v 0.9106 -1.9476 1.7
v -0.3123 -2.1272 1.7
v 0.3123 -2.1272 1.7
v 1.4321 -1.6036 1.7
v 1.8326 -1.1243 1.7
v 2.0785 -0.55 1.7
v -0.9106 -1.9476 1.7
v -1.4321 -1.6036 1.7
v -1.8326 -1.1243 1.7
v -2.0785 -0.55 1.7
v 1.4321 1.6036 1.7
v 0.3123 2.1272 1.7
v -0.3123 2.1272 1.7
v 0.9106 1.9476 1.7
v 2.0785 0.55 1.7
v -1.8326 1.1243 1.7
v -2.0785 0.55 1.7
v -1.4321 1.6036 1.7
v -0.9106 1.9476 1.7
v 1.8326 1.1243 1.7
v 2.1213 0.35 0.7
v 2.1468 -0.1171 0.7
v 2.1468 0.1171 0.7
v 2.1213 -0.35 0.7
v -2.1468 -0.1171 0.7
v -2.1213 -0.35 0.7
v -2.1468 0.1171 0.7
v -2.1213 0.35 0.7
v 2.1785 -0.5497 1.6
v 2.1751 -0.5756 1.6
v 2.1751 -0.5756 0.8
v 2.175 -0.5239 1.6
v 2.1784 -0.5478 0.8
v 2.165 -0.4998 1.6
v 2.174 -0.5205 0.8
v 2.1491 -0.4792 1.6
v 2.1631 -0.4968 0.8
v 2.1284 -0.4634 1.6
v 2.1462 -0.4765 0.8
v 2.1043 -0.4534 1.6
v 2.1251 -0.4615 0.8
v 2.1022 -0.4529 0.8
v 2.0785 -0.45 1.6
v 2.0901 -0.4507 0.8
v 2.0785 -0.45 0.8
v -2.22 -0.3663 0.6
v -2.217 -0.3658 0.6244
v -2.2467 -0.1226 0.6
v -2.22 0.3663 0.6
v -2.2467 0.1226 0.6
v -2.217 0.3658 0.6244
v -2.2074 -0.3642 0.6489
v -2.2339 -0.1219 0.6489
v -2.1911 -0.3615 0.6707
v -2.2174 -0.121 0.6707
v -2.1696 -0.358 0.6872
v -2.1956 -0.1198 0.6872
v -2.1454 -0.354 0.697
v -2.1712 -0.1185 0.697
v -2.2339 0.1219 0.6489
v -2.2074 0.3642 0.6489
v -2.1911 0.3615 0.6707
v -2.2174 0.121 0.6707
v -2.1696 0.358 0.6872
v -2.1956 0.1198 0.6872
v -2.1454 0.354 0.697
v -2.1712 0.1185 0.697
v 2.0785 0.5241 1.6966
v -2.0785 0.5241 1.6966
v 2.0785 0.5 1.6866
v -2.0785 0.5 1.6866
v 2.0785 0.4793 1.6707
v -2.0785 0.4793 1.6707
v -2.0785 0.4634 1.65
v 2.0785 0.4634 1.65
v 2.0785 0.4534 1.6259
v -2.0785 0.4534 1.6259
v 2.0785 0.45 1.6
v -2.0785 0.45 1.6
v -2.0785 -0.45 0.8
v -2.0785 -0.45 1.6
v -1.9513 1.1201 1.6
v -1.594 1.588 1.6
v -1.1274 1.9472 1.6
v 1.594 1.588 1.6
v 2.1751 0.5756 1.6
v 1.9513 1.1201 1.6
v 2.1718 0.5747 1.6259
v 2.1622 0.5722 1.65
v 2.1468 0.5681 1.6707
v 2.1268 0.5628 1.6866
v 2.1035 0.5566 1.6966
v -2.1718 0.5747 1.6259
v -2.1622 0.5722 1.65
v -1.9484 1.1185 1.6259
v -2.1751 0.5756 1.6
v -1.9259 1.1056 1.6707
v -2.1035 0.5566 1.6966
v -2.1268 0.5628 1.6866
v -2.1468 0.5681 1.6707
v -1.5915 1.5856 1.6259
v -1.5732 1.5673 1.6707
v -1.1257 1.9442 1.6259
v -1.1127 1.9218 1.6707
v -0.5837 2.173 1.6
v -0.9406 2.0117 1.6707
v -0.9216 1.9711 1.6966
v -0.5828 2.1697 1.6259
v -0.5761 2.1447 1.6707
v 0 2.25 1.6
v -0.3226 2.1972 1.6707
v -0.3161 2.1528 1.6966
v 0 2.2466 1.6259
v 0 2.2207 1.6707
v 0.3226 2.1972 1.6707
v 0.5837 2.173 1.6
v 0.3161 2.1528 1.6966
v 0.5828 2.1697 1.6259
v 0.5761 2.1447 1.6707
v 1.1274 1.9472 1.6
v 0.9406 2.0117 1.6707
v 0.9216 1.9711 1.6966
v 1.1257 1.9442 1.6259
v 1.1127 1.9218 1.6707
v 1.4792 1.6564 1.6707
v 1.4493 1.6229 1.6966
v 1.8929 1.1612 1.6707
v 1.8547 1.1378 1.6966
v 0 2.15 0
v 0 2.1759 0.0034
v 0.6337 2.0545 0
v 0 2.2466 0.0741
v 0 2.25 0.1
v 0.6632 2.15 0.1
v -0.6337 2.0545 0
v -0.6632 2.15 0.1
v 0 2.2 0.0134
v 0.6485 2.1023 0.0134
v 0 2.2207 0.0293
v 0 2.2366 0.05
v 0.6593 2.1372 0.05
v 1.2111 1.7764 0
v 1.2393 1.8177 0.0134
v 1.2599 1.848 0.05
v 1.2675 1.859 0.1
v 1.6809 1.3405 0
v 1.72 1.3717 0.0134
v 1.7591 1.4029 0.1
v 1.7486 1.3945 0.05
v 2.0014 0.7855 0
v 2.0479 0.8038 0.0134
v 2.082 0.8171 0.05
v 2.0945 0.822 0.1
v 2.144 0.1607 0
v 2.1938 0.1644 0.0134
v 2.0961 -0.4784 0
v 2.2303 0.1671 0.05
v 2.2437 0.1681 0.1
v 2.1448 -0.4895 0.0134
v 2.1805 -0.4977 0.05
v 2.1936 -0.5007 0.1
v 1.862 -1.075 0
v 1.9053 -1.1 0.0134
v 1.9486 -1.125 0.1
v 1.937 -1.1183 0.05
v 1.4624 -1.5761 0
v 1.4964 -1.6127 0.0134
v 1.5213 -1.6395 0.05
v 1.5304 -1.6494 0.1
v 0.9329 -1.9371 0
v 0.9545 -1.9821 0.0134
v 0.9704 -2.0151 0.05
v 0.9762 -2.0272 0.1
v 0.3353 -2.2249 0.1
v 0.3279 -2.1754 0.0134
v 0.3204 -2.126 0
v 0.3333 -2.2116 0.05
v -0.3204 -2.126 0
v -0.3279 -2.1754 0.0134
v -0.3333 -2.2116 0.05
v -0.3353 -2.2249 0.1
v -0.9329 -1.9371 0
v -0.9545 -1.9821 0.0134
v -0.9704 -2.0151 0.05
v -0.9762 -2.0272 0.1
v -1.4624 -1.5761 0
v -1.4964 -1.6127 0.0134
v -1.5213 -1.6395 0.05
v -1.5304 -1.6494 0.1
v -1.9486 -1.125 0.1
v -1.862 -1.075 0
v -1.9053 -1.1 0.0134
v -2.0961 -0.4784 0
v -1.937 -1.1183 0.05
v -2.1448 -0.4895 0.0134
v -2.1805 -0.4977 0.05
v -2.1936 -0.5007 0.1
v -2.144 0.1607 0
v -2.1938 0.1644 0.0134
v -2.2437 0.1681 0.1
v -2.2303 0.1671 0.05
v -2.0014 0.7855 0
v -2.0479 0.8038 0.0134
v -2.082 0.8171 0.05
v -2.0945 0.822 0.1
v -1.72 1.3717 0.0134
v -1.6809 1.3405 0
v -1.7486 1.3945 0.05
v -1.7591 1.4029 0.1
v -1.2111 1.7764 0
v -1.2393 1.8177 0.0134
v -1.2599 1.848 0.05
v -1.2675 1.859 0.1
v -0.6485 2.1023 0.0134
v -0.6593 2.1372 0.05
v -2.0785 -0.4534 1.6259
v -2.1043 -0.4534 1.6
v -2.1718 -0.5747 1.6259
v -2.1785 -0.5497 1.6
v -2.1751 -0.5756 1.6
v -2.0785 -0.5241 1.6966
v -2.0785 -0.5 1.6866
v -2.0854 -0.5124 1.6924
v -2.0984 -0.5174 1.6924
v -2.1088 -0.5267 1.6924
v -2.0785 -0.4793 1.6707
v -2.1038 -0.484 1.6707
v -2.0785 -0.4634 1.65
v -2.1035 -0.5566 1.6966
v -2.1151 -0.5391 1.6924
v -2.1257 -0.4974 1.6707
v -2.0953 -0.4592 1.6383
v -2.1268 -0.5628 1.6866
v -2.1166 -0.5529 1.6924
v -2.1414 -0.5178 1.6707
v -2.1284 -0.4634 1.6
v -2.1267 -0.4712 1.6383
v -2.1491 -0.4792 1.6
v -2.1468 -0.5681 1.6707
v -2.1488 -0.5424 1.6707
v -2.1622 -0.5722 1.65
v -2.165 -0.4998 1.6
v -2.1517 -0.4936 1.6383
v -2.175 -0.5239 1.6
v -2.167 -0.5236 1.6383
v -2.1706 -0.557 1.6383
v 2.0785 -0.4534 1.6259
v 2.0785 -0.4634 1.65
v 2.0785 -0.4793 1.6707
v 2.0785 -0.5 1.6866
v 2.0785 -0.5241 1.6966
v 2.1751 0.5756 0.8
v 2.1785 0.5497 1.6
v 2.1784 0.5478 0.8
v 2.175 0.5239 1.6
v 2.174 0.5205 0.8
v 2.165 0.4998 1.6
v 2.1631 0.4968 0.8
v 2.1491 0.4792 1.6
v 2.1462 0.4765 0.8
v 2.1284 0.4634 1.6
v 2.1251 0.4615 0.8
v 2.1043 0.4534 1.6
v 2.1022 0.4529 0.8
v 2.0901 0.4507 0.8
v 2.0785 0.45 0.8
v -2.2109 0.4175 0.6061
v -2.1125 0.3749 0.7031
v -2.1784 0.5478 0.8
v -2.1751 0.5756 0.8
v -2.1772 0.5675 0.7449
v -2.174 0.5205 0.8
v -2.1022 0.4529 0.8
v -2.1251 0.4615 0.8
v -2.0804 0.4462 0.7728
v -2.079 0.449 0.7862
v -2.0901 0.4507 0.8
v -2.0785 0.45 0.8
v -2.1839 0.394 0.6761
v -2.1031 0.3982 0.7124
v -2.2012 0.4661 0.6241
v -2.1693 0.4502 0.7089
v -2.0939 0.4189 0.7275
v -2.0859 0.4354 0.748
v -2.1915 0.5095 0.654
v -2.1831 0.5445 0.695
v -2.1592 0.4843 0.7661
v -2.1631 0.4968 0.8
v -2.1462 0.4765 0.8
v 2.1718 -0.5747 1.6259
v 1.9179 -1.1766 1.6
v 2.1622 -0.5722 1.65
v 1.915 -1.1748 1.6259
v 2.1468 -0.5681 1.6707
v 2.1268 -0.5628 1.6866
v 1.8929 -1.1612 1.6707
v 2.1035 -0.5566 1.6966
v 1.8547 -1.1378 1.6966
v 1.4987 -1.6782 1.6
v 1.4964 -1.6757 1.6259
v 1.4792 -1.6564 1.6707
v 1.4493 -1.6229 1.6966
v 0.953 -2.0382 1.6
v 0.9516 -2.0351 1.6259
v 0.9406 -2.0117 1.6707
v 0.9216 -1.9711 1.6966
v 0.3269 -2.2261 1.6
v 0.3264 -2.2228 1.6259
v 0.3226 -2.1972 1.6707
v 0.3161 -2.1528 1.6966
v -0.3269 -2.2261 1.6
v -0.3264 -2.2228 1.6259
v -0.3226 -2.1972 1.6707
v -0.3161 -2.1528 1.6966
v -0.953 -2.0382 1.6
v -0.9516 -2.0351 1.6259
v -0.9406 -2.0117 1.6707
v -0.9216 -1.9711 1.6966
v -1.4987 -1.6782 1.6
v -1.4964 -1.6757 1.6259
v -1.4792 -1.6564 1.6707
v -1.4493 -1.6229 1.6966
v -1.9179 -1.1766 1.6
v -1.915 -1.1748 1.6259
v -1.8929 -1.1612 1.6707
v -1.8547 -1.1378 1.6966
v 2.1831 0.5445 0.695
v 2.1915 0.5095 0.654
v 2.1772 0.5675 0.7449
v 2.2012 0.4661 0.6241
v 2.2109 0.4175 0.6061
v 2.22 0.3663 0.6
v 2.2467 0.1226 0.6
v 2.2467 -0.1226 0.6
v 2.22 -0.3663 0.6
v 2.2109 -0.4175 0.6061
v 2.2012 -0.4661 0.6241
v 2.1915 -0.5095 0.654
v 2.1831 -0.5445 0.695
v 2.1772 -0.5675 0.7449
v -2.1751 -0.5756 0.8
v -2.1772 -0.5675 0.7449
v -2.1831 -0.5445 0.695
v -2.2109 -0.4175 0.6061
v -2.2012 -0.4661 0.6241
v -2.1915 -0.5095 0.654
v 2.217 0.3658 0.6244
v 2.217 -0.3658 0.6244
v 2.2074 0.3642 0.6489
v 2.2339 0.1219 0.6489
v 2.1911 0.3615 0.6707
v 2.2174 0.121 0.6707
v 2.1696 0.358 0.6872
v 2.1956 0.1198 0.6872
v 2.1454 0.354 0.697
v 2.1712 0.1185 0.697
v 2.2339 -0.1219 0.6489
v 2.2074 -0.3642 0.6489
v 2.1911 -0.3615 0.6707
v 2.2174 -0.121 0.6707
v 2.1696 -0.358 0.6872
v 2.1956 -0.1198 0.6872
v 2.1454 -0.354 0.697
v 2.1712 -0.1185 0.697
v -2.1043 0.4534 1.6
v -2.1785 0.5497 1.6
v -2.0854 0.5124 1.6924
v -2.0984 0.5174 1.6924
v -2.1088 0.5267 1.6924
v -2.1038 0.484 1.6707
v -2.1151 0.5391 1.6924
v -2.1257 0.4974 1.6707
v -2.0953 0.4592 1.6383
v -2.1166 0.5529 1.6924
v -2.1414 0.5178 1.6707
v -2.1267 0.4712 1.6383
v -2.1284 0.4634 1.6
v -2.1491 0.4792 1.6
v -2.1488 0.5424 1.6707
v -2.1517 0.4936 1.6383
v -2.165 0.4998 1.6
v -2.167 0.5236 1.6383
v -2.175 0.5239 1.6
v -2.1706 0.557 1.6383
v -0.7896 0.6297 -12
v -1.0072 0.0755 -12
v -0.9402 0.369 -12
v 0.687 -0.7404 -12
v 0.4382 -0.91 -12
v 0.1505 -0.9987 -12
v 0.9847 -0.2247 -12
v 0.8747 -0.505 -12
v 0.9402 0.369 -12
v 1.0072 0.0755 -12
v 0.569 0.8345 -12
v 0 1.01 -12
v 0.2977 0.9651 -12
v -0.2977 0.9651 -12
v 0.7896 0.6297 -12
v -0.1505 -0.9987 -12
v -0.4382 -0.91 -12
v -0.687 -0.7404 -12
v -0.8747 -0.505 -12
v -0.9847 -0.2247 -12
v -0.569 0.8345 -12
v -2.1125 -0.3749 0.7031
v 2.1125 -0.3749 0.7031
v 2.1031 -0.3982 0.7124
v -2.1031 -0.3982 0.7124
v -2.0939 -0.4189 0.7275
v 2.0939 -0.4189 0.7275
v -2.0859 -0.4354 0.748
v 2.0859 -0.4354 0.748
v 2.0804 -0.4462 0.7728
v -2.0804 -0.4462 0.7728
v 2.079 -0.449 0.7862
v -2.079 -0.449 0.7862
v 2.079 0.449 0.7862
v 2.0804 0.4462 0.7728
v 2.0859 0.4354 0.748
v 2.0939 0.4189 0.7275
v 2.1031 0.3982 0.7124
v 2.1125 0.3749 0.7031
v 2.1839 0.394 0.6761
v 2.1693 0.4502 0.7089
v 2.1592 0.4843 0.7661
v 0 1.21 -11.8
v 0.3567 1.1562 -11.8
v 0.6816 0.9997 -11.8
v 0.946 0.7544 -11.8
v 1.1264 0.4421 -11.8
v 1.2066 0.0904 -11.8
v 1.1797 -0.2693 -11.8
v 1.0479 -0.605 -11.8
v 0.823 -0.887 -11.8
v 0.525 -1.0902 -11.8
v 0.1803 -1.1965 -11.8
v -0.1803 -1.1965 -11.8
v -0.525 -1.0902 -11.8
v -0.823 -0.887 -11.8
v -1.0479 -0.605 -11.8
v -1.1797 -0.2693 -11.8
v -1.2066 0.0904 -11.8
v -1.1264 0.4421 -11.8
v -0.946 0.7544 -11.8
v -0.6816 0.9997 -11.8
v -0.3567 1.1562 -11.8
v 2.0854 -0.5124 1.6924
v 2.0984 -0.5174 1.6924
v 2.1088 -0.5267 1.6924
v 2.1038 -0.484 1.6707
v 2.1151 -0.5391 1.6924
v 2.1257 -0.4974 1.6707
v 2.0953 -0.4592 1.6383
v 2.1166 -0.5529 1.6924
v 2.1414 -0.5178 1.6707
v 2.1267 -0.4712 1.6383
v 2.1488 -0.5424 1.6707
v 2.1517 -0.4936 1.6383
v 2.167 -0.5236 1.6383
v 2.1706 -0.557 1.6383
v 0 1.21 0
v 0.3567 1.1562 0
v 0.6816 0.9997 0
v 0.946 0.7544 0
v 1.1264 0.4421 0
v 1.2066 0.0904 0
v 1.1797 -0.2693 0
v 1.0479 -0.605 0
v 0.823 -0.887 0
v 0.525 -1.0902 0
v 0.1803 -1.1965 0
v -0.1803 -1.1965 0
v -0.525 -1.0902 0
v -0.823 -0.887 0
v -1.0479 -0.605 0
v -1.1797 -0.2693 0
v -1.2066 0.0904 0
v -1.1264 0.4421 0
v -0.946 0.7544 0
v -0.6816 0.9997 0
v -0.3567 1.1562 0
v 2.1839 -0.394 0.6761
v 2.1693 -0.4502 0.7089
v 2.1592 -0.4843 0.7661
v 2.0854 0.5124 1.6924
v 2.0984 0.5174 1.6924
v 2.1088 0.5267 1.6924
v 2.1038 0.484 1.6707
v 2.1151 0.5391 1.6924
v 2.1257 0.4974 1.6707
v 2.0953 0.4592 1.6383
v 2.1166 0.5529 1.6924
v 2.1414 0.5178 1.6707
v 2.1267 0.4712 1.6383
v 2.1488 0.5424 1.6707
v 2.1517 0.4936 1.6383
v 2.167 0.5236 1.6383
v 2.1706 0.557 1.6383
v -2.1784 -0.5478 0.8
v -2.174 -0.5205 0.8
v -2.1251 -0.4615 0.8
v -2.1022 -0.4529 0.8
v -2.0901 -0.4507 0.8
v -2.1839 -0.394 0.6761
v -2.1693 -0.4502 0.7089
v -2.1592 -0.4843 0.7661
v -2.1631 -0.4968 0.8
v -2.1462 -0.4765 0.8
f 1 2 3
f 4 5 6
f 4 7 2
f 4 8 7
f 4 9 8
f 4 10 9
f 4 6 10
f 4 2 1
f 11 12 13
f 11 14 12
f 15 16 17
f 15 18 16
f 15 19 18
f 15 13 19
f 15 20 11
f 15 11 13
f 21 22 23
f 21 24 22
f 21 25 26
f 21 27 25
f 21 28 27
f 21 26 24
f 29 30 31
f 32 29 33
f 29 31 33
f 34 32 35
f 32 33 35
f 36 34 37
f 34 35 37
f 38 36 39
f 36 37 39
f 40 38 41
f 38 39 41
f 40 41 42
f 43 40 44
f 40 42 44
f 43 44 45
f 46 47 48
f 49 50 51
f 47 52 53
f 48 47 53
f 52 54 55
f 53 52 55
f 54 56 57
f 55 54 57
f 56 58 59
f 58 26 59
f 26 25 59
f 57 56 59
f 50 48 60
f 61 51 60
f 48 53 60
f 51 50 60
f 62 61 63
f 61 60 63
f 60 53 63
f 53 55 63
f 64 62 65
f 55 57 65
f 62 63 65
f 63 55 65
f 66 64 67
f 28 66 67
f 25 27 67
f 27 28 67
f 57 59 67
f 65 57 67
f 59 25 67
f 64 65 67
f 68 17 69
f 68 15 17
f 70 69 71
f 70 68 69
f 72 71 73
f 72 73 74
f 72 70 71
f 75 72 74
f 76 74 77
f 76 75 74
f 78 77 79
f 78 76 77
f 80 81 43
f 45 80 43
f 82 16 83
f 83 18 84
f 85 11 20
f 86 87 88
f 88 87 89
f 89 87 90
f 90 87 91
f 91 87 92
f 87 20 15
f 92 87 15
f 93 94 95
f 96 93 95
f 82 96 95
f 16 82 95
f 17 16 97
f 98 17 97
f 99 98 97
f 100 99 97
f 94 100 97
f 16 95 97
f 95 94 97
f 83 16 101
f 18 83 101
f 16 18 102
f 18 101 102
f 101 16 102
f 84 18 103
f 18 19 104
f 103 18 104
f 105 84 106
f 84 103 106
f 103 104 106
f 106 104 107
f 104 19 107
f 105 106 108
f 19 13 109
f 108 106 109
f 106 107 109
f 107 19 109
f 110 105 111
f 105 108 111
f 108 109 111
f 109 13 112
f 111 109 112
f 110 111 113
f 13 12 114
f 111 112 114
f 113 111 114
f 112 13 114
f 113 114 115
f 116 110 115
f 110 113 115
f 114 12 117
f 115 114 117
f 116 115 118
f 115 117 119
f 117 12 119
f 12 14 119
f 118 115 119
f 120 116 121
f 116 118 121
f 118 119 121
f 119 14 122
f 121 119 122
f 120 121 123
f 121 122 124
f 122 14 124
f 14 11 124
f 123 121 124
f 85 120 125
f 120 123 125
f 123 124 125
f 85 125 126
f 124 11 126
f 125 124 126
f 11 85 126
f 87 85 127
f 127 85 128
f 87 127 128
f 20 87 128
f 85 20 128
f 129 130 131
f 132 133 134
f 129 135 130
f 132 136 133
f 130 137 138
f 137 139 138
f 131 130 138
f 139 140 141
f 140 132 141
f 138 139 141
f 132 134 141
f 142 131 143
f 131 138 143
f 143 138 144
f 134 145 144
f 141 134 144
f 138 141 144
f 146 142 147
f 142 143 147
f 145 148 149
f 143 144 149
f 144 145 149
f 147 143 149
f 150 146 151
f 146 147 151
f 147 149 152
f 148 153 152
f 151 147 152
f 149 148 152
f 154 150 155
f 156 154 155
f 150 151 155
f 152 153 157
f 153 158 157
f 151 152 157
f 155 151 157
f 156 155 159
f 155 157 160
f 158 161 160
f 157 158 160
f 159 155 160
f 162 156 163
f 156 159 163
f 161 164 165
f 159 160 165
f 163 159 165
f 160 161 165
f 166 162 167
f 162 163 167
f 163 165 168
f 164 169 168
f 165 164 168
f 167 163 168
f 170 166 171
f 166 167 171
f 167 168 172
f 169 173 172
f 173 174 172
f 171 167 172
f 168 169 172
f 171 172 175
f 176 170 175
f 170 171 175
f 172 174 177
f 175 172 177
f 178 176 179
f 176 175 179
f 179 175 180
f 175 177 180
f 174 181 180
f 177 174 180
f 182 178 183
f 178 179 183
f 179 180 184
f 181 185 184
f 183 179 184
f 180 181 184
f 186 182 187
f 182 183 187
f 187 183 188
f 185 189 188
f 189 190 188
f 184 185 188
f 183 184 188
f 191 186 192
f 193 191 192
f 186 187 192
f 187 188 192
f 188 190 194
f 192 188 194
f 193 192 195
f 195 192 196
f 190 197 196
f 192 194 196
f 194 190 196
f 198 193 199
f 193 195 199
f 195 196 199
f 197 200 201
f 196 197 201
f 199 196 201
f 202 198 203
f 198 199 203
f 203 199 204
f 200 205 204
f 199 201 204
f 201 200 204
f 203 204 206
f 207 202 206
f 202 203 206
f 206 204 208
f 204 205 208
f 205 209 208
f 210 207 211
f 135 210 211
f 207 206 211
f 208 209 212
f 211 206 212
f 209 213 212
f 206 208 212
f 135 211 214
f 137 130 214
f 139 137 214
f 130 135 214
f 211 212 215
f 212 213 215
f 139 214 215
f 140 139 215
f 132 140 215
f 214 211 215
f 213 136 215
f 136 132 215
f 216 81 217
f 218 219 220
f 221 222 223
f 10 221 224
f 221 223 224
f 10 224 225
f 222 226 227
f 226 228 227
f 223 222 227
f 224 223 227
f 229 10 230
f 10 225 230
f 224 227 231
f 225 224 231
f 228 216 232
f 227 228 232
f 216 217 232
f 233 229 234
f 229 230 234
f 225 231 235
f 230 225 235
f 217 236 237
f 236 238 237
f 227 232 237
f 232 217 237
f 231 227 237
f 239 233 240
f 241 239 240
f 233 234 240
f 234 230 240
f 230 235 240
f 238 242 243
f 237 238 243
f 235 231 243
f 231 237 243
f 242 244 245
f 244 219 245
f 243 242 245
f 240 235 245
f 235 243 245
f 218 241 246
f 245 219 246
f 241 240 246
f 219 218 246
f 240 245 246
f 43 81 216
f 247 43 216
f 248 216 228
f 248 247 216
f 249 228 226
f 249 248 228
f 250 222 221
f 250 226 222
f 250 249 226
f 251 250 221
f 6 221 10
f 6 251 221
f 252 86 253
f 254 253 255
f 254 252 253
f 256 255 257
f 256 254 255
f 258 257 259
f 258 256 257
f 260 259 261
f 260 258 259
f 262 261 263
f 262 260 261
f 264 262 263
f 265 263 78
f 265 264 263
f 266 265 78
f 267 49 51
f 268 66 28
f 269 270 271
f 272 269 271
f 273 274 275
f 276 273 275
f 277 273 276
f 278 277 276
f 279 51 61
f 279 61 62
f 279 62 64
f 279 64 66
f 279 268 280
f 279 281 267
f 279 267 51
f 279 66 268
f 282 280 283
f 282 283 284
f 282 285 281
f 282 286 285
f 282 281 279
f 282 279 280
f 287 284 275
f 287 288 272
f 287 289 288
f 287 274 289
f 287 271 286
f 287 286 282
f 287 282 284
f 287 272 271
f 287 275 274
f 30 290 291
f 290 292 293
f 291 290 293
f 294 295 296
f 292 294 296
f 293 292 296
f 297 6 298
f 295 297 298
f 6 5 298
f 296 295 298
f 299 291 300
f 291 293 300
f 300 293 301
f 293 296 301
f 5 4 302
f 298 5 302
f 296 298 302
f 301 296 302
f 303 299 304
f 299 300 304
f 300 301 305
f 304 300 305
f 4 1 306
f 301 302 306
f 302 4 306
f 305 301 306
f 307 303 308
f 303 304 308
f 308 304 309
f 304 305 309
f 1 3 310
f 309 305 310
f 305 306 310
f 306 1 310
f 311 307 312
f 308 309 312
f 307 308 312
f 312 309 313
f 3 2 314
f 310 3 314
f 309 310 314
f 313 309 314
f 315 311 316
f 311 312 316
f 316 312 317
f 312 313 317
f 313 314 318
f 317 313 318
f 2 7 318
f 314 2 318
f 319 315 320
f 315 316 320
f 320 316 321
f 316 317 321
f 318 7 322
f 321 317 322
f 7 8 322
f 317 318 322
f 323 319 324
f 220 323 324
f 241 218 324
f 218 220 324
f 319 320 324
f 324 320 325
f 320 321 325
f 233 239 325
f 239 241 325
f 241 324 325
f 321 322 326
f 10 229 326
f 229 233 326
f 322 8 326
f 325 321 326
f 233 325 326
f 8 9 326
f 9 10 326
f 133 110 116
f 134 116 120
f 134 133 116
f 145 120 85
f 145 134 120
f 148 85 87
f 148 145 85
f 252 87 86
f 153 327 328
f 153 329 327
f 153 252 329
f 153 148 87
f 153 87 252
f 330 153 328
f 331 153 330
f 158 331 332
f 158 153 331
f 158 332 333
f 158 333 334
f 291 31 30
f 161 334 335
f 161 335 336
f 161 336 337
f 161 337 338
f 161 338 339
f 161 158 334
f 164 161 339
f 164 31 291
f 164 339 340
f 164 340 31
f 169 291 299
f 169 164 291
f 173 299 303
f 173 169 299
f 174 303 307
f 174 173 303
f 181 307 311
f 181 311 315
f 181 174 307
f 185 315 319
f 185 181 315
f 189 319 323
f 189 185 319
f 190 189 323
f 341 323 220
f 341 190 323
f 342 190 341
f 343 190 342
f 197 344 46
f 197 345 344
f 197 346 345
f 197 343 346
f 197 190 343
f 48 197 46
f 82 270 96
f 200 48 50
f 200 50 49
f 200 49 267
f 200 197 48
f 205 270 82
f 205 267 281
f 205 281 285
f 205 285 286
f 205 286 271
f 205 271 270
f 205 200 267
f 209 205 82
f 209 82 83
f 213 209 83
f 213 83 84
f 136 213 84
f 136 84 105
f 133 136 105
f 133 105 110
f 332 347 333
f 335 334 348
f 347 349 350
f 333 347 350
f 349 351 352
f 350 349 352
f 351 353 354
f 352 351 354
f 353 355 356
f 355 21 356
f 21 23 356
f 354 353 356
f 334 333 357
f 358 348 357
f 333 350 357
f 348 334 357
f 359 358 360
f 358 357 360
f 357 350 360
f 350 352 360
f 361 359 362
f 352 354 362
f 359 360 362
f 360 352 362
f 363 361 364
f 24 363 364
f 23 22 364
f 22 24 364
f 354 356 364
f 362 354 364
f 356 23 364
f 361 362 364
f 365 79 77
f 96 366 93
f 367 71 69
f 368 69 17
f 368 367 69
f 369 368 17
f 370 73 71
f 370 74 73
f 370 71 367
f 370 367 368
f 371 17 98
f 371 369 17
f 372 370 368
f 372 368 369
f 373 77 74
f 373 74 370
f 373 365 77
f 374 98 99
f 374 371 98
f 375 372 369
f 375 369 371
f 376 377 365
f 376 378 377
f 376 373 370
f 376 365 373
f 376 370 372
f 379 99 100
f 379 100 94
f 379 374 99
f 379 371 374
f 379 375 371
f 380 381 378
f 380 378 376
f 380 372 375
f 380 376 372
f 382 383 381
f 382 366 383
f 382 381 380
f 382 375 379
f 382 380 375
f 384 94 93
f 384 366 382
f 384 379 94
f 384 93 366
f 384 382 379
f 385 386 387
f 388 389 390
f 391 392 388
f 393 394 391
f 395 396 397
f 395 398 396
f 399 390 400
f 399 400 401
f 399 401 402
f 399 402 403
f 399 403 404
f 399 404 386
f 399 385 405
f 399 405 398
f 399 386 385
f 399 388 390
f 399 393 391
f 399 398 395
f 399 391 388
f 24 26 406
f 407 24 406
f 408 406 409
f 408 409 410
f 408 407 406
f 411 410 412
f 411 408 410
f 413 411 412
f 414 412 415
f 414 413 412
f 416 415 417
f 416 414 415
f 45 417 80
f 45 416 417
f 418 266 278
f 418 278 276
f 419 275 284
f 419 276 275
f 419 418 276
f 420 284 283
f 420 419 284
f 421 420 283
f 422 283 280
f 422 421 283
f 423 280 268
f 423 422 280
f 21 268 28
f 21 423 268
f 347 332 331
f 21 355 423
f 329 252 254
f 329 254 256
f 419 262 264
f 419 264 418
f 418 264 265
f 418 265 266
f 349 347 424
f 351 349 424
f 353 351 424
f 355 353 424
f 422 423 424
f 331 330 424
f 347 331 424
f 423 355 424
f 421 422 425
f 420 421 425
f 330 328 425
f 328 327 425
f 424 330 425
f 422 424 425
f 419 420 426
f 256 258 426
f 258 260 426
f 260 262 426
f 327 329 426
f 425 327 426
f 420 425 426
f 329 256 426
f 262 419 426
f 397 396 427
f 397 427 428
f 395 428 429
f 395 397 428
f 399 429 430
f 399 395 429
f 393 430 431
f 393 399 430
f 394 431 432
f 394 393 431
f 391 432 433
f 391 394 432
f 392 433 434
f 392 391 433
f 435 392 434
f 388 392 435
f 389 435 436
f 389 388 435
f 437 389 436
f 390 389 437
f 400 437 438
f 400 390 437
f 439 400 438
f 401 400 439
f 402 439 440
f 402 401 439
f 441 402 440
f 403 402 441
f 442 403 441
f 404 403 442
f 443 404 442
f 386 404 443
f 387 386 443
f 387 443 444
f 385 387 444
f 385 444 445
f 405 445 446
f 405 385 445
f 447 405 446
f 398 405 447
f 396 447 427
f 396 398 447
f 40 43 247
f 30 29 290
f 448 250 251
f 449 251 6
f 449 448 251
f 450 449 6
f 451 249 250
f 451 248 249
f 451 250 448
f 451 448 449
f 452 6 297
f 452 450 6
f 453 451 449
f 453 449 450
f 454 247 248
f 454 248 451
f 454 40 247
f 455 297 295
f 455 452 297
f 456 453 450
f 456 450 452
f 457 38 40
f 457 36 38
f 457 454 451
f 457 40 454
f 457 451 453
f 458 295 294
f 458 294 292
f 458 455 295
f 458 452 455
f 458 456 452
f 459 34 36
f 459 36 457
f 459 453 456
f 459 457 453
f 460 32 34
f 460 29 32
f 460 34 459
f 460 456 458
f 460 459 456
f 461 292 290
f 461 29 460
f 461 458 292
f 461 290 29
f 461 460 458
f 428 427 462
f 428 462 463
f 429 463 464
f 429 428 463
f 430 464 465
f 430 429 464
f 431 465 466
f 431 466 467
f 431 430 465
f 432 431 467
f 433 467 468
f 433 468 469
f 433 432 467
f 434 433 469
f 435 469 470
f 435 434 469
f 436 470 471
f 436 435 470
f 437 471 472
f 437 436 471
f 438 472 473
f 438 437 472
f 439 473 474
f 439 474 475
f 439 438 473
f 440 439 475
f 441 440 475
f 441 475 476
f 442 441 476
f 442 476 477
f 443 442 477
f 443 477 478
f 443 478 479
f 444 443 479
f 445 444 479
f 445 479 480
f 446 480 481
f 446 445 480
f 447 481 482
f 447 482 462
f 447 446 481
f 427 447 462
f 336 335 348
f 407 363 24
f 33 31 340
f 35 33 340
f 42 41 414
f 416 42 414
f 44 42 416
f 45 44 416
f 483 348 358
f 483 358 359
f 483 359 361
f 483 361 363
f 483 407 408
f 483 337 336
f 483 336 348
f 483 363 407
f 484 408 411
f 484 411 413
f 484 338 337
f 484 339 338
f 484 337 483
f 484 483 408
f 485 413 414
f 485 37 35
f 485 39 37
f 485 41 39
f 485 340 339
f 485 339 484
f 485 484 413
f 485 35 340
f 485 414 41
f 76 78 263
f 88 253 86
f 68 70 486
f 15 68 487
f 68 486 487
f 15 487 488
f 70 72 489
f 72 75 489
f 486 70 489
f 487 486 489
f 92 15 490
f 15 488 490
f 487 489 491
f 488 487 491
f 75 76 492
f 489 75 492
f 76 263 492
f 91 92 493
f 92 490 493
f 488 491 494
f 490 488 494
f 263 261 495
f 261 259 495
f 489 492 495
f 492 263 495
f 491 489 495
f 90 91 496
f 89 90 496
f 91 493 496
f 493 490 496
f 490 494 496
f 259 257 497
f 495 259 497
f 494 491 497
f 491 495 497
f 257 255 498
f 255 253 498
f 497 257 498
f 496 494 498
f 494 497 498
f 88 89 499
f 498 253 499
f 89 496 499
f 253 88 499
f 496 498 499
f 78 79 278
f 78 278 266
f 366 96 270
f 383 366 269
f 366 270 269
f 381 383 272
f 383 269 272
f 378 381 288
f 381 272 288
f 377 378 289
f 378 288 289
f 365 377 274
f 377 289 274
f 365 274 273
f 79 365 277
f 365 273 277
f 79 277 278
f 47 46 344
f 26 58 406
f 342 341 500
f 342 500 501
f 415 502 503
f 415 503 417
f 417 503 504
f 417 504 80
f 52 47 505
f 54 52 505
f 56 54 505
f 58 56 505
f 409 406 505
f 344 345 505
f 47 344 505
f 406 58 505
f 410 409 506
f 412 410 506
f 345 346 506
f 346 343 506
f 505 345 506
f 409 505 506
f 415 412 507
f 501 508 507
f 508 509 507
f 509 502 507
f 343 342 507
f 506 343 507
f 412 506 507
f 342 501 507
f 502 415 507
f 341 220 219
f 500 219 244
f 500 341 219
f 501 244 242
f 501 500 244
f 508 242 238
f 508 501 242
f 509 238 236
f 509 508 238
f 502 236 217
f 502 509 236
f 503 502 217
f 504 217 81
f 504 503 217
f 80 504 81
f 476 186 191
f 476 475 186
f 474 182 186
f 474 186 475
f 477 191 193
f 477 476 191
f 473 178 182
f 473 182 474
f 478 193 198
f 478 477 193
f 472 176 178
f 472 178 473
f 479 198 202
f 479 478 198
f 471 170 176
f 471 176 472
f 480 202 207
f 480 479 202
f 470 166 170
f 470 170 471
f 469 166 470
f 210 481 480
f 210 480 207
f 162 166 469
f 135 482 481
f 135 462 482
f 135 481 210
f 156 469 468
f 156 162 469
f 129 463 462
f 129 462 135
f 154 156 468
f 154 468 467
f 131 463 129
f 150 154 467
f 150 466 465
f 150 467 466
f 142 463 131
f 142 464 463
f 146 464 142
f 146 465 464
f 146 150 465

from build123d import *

# Parameters (mm, degrees)
SKIZZE2_W                       = 4.5
SKIZZE2_H                       = 0.9
SCHNITT_LINEAR_AUSTRAGEN1_DEPTH = 1
FASE1_SIZE                      = 0.2
VERRUNDUNG2_R                   = 0.1


with BuildPart() as part:
    # Skizze1 → Rotation1 (revolve)
    with BuildSketch(Plane(origin=(0, 0, 0), x_dir=(0, 0, -1), z_dir=(1, 0, 0))):
        Polygon((-1.7, 0), (-1.7, 2.25), (0, 2.25), (0, 1.21), (12, 1.21), (12, 0), align=None)
    revolve(axis=Axis((0, 0, 21.919879518), (0, 0, -1)))

    # Skizze2 → Schnitt-Linear austragen1 (cut)
    with BuildSketch(Plane.XY.offset(1.7)):
        Rectangle(SKIZZE2_W, SKIZZE2_H)
    extrude(amount=-SCHNITT_LINEAR_AUSTRAGEN1_DEPTH, mode=Mode.SUBTRACT)

    # Fase1
    fase1_edges = [part.edges().sort_by_distance(p)[0] for p in [
        (0, -1.21, -12),
    ]]
    chamfer(fase1_edges, length=FASE1_SIZE)

    # Verrundung2
    verrundung2_edges = [part.edges().sort_by_distance(p)[0] for p in [
        (1.423024947, 1.742842506, 1.7),
        (0, -2.25, 1.7),
        (2.25, 0, 0.7),
        (2.204540769, 0.45, 1.2),
        (2.204540769, -0.45, 1.2),
        (-2.25, 0, 0.7),
        (-2.204540769, 0.45, 1.2),
        (-2.204540769, -0.45, 1.2),
        (0, -0.45, 0.7),
        (0, 0.45, 0.7),
        (0, 0.45, 1.7),
        (0, -0.45, 1.7),
        (0, -2.25, 0),
    ]]
    fillet(verrundung2_edges, radius=VERRUNDUNG2_R)


solid = part.part
